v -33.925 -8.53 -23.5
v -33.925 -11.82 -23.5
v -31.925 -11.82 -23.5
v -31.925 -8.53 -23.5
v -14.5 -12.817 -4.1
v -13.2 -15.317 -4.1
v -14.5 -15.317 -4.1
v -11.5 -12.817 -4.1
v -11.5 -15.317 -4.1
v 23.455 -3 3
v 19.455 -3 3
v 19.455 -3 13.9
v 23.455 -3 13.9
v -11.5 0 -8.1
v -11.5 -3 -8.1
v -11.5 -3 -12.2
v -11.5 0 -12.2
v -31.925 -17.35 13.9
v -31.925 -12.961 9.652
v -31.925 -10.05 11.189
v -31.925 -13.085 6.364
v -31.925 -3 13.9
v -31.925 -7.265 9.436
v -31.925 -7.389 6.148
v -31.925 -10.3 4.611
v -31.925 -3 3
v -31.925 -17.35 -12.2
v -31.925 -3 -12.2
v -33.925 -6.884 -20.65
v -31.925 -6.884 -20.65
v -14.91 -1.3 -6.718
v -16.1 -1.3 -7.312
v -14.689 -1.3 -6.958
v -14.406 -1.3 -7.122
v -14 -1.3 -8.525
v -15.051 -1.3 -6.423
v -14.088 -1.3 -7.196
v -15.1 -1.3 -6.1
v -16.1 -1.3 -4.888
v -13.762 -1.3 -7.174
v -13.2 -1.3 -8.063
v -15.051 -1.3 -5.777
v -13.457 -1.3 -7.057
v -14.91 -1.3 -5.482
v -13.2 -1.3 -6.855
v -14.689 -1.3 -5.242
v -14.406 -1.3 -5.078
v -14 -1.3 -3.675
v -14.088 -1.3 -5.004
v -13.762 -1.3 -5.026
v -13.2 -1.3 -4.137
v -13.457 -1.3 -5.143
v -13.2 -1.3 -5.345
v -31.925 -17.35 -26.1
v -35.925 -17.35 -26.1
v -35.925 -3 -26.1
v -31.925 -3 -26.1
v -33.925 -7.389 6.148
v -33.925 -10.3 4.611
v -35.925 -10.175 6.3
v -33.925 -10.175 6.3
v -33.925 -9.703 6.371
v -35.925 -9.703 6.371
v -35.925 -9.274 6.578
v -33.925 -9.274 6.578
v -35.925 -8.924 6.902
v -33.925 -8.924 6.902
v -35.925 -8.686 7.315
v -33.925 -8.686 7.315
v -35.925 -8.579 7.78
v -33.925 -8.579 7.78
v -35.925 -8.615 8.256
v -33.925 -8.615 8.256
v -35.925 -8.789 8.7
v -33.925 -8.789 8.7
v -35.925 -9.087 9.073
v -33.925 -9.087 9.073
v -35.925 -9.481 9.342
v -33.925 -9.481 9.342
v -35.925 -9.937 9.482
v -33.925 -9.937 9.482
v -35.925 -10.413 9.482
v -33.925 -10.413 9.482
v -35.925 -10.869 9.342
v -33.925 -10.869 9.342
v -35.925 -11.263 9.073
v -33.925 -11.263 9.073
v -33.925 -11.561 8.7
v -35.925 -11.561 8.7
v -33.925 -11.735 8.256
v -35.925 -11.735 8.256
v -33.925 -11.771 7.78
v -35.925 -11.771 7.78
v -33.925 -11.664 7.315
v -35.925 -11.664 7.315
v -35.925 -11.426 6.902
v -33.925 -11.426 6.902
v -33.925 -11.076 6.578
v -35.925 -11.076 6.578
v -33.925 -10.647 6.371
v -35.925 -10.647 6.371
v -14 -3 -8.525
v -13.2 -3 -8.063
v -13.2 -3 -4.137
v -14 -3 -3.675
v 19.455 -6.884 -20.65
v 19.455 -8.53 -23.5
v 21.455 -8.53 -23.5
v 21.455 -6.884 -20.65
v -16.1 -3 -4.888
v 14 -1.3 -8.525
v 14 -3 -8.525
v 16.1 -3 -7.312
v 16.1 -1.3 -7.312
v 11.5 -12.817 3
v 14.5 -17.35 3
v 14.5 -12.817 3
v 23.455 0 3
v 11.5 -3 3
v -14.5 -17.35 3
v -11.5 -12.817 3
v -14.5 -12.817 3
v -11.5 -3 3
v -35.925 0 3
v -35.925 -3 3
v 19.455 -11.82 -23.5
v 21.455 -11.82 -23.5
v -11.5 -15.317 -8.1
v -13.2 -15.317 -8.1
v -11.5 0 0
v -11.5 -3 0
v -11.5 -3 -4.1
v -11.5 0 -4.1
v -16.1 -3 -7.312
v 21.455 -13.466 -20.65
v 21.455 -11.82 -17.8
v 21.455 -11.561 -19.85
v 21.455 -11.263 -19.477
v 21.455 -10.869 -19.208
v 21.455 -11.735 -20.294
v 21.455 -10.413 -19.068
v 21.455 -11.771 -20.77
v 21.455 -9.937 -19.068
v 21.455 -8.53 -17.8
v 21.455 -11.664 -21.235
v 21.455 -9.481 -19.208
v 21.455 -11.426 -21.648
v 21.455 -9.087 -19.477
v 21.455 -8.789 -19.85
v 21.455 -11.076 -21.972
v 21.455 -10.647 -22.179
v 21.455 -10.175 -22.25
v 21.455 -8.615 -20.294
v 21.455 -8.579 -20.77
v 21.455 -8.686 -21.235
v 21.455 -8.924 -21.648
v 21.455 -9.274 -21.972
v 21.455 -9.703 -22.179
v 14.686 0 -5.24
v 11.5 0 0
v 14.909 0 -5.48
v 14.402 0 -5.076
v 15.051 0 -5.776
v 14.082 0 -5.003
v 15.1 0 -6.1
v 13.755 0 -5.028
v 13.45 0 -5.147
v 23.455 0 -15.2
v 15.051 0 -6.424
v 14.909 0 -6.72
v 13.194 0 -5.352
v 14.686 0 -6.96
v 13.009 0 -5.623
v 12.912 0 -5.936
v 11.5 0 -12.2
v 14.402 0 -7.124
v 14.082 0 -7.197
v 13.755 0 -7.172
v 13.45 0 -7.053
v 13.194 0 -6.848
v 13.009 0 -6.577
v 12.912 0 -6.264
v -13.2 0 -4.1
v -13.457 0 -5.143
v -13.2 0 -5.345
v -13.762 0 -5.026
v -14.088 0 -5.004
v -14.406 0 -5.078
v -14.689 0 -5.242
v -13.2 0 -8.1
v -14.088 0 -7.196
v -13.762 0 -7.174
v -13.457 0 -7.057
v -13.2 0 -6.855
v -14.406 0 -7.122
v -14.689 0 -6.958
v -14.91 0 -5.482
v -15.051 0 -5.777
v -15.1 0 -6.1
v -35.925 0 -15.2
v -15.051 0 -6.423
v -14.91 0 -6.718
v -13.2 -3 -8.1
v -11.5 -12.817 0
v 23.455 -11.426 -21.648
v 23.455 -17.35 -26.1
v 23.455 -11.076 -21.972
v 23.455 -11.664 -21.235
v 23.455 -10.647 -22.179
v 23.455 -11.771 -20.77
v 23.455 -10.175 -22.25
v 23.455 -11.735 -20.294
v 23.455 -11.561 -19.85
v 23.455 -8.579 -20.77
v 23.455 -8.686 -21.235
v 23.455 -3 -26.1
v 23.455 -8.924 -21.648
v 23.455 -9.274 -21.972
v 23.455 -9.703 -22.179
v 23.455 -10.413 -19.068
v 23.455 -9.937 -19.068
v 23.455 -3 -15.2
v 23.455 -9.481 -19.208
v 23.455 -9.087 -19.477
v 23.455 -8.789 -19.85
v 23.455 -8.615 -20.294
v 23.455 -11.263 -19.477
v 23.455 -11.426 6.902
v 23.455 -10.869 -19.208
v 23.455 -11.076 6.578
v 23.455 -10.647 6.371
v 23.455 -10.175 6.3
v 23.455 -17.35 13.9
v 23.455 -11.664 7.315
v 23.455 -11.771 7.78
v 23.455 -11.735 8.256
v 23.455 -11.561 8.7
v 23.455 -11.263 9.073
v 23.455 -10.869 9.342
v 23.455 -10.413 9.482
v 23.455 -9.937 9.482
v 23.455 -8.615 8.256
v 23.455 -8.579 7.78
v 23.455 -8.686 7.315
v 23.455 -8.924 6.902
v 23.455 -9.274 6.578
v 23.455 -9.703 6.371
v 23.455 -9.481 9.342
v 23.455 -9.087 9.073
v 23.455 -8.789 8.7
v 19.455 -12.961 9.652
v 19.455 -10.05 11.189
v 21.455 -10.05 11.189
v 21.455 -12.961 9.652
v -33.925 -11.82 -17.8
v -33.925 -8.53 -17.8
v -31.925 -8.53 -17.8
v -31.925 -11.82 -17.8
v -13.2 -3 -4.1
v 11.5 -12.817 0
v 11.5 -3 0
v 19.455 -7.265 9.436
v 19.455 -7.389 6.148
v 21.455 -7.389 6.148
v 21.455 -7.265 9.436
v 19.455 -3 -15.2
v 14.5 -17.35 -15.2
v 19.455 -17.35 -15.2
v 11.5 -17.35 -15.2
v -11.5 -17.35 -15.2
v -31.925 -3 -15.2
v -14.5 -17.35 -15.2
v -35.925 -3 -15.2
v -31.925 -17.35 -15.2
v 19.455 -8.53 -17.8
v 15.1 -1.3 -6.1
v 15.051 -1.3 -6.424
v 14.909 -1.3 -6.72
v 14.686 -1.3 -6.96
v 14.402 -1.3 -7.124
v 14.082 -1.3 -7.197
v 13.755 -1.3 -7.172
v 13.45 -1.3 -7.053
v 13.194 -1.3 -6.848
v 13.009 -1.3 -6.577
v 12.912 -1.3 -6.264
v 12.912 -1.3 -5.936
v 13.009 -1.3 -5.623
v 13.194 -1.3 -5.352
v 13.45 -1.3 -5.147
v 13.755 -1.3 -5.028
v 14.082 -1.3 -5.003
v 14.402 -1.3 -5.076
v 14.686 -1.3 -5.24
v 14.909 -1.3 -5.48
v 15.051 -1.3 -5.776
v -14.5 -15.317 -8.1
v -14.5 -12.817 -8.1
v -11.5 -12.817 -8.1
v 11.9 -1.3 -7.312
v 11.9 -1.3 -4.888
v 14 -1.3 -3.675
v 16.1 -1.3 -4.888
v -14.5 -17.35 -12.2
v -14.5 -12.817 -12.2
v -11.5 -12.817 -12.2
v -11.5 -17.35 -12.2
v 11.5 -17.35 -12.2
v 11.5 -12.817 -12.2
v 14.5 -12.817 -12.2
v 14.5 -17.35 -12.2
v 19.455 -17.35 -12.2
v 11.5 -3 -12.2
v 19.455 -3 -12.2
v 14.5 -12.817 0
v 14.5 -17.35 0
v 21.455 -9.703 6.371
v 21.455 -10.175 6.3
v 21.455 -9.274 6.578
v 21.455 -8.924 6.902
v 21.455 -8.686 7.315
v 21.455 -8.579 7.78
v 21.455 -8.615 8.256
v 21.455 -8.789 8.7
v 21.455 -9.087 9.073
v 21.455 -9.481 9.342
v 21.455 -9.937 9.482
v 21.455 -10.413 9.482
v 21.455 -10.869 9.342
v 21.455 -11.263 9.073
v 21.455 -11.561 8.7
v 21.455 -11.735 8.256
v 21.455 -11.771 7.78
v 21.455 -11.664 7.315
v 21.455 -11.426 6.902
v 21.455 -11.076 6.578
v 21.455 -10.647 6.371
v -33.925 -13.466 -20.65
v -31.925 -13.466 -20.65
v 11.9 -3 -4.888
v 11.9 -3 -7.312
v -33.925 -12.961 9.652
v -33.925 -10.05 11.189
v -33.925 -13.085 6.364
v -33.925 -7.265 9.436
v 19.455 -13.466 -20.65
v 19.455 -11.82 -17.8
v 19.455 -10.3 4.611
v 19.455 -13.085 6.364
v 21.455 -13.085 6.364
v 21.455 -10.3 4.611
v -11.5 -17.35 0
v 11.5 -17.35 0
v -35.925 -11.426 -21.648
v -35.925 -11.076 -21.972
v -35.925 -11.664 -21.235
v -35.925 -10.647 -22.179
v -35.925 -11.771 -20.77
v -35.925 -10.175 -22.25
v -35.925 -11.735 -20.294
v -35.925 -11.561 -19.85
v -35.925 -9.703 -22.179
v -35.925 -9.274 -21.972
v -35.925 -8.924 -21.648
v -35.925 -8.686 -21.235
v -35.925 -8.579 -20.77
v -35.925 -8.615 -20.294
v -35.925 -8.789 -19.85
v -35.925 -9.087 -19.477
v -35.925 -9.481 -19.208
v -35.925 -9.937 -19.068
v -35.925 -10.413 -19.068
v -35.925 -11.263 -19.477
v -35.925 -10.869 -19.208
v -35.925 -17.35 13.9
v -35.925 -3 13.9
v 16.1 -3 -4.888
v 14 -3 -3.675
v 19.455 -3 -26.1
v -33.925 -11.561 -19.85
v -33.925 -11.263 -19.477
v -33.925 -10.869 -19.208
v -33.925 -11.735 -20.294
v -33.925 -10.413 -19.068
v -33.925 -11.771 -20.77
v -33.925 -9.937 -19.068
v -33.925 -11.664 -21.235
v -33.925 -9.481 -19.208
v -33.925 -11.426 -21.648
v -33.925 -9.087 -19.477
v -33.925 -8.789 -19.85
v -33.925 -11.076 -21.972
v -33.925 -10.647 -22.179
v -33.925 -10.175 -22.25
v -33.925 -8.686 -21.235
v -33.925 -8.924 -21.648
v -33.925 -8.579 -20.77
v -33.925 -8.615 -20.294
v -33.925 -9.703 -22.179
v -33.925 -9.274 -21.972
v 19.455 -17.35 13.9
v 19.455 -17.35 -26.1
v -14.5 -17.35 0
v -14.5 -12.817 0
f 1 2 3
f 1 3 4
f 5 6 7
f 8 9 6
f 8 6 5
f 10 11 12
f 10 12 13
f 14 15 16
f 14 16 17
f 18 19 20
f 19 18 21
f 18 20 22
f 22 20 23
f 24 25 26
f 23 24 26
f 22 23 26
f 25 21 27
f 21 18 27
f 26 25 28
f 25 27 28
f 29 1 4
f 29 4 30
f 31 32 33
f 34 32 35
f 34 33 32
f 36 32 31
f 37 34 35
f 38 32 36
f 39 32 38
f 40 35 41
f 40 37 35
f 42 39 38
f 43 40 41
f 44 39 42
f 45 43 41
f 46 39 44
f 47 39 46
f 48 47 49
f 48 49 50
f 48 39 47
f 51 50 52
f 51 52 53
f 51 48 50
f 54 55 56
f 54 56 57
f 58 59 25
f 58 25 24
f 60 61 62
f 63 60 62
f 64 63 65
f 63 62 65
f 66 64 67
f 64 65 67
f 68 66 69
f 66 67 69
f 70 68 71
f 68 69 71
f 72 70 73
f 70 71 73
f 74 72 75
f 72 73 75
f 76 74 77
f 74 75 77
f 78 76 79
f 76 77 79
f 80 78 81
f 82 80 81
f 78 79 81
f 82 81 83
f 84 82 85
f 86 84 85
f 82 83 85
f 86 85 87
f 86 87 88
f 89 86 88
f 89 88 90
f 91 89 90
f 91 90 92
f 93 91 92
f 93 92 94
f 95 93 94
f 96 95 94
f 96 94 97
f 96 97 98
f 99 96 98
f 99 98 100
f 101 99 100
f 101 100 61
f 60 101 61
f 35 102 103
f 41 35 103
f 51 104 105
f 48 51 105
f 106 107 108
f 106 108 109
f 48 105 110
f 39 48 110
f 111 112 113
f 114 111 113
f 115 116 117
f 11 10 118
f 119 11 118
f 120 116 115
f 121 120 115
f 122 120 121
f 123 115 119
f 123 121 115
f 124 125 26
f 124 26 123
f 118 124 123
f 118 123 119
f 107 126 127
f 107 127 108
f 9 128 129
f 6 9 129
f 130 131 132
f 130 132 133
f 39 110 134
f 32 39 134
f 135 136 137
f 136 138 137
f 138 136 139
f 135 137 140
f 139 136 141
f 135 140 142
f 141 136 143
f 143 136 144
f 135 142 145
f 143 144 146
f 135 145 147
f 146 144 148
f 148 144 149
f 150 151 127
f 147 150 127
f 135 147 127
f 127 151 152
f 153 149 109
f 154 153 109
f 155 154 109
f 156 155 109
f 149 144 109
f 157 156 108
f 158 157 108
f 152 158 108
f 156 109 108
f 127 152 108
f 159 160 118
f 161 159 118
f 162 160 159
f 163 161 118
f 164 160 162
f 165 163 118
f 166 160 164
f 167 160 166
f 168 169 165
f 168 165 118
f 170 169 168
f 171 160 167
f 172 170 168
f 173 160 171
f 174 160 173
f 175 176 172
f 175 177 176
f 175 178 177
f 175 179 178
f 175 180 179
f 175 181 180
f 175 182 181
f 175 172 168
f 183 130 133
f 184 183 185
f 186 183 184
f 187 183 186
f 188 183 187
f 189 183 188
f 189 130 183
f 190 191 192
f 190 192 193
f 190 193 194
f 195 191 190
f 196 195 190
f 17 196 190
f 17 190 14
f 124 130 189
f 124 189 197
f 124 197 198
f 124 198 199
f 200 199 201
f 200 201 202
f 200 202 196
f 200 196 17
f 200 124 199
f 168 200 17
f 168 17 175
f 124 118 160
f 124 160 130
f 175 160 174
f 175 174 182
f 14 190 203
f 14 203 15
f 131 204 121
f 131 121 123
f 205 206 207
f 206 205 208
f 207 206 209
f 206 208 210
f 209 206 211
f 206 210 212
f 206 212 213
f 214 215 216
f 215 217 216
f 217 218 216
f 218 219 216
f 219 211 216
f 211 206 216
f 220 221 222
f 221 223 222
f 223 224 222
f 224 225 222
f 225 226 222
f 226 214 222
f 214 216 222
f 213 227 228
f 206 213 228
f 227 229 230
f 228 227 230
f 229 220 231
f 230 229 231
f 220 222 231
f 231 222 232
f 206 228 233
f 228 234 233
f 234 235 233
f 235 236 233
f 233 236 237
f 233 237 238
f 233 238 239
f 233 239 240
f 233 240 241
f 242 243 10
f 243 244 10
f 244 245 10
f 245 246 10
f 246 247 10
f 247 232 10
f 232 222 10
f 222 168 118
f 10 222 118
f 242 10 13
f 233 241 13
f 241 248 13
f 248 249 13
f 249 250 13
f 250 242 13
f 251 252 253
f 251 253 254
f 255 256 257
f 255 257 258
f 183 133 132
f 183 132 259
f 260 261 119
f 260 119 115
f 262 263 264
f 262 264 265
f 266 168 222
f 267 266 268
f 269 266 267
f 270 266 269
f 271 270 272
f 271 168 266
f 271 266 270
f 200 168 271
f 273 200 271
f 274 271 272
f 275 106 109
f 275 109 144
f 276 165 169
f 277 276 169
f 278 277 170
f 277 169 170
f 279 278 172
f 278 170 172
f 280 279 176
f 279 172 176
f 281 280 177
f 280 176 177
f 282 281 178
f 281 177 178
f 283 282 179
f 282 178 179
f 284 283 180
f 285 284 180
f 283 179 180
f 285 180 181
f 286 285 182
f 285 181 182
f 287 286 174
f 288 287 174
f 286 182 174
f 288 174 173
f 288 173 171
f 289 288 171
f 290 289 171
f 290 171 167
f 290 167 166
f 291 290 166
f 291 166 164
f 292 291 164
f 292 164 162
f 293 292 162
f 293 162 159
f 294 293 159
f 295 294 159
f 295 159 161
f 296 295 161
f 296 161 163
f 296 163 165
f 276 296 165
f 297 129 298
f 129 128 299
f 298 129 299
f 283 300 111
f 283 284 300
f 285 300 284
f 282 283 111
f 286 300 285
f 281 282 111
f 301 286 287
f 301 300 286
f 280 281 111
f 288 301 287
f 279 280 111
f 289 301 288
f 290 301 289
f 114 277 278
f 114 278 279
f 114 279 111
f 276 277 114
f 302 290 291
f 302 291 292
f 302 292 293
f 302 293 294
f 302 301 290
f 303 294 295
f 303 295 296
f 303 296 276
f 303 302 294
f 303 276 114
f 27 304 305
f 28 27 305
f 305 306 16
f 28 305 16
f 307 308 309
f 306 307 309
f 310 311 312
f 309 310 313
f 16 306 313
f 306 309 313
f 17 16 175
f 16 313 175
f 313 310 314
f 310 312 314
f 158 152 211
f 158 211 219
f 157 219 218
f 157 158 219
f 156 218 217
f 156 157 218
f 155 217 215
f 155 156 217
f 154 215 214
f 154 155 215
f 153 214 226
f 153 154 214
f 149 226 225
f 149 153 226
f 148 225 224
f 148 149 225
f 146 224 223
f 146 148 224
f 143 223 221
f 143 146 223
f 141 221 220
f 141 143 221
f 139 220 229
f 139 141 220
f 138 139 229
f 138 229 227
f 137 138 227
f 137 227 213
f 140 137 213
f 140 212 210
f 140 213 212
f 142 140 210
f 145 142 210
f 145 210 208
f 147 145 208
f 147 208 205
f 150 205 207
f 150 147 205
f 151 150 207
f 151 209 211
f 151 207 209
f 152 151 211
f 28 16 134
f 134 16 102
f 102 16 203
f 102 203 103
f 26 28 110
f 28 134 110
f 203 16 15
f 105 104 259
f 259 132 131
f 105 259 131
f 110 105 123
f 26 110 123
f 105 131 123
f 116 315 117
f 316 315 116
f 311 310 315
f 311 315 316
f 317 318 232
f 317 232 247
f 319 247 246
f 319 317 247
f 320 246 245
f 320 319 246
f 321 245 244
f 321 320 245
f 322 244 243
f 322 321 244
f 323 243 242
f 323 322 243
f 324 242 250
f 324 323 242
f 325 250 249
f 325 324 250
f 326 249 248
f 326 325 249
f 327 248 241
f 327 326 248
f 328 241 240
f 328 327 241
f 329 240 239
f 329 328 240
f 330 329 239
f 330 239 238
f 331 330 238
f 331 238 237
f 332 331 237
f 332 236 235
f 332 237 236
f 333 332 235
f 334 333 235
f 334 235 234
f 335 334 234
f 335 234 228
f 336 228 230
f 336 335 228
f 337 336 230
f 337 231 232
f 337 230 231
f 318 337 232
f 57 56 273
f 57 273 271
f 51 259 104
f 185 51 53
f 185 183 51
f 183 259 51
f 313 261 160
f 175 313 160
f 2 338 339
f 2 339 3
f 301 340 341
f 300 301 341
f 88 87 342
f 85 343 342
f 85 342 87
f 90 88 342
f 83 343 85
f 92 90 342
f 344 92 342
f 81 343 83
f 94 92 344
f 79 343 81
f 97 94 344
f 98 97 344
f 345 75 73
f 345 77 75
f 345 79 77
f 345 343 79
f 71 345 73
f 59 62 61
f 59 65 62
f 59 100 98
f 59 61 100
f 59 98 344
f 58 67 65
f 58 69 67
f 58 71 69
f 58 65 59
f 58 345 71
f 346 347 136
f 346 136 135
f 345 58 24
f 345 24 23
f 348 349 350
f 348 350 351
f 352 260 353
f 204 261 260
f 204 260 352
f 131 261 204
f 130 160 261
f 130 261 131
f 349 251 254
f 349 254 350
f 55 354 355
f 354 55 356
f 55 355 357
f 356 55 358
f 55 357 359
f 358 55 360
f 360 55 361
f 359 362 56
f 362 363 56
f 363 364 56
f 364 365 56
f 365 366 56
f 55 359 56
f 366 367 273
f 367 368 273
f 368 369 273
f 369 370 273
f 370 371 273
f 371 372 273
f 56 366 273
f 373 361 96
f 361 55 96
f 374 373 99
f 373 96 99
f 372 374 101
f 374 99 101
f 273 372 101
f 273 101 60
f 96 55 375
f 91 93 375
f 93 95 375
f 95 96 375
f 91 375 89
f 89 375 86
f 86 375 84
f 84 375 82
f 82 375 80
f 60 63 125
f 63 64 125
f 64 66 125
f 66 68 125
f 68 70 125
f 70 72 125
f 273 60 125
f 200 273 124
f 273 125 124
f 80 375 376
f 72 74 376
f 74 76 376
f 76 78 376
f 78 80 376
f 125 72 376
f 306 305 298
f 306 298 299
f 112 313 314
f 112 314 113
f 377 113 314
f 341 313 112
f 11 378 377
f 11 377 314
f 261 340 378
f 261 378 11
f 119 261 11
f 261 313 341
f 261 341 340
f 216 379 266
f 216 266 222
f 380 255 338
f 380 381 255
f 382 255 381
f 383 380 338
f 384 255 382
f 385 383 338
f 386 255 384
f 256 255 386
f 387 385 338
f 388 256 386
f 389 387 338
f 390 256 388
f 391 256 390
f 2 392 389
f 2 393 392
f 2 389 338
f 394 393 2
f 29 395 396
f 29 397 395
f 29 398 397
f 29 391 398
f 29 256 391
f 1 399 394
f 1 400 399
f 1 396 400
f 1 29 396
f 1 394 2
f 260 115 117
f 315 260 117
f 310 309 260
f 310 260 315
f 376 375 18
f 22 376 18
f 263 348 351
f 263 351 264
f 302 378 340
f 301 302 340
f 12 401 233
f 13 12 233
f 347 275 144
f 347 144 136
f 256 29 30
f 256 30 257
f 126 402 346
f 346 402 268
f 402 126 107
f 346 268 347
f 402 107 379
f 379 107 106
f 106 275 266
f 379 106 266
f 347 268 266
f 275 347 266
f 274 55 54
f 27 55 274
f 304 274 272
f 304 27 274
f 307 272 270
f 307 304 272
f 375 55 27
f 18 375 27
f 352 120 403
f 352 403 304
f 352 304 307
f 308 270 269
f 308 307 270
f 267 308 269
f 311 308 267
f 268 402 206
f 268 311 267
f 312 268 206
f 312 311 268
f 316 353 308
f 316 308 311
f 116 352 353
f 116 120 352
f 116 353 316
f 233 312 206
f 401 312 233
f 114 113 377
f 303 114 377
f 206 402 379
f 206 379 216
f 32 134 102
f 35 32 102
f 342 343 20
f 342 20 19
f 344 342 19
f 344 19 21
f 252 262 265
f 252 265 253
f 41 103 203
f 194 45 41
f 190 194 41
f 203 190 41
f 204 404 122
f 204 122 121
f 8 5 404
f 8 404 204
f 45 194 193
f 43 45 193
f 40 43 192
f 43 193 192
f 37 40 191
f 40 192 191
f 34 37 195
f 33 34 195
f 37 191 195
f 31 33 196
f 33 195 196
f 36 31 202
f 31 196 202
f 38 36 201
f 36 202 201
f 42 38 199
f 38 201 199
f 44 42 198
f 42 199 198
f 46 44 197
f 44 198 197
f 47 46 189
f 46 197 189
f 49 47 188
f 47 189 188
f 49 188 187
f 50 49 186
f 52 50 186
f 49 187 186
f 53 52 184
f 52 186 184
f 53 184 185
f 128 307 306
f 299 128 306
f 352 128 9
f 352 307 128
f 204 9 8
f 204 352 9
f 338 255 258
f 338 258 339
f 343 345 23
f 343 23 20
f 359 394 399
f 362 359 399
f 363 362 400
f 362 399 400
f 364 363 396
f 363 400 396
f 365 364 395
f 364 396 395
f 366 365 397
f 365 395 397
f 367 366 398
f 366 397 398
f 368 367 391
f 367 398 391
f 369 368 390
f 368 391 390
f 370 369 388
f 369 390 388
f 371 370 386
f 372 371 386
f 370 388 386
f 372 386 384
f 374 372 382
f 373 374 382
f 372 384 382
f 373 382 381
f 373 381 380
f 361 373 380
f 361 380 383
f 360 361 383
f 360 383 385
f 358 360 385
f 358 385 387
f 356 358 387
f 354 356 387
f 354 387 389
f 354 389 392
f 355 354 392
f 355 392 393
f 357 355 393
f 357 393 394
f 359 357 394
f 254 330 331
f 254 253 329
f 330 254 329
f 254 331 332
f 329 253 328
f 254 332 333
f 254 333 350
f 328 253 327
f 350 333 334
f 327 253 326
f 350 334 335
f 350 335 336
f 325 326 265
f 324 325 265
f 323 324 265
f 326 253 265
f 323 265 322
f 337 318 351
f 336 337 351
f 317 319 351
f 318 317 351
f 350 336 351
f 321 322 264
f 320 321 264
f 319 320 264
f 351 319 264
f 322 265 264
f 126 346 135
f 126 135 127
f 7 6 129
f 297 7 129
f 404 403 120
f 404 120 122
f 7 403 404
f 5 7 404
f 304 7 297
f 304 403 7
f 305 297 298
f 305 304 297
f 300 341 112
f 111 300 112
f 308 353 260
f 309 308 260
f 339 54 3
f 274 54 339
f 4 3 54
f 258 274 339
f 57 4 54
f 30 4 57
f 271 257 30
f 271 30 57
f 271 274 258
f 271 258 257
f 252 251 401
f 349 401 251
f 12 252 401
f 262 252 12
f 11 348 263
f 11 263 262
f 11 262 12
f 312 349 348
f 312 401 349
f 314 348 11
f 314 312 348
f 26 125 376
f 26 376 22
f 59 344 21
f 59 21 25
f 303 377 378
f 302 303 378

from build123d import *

# Parameters (mm, degrees)
BOSS_EXTRUDE1_DEPTH      = 3
SKETCH2_W                = 5
SKETCH2_H                = 3
SKETCH2_W_2              = 3
SKETCH2_H_2              = 4.533238731
BOSS_EXTRUDE2_DEPTH      = 15.2
BOSS_EXTRUDE3_DEPTH      = 3
BOSS_EXTRUDE4_DEPTH      = 19.425
BOSS_EXTRUDE5_DEPTH      = 6.955
CUT_EXTRUDE1_REACH       = 19.35
SKETCH6_R                = 1.1
CUT_EXTRUDE2_DEPTH       = 1.7
SKETCH8_W                = 4
SKETCH8_H                = 14.35
BOSS_EXTRUDE6_DEPTH      = 26.1
BOSS_EXTRUDE6_DEPTH_BACK = 13.9
SKETCH10_R               = 1.6
CUT_EXTRUDE3_DEPTH       = 56.38
CUT_EXTRUDE3_DEPTH_BACK  = 5
CUT_EXTRUDE5_START       = -2
CUT_EXTRUDE5_DEPTH       = 55.38
CUT_EXTRUDE6_DEPTH       = 7.5
CUT_EXTRUDE6_DEPTH_BACK  = 15.316761
CUT_EXTRUDE7_REACH       = 24.725
SKETCH13_W               = 4
SKETCH13_H               = 2.5


with BuildPart() as part:
    # Sketch1 → Boss-Extrude1 (new body)
    with BuildSketch(Plane.XY):
        Polygon((16.5, 0), (16.5, -3), (11.5, -3), (11.5, -12.816761269), (14.5, -12.816761269), (14.5, -17.35), (-14.5, -17.35), (-14.5, -12.816761269), (-11.5, -12.816761269), (-11.5, -3), (-16.5, -3), (-16.5, 0), align=None)
    extrude(amount=BOSS_EXTRUDE1_DEPTH)

    # Sketch2 → Boss-Extrude2 (add)
    with BuildSketch(Plane(origin=(0, 0, 0), x_dir=(-1, 0, 0), z_dir=(0, 0, -1))):
        with Locations((-14, -1.5)):
            Rectangle(SKETCH2_W, SKETCH2_H)
        with Locations((14, -1.5)):
            Rectangle(SKETCH2_W, SKETCH2_H)
        with Locations((-13, -15.083380635)):
            Rectangle(SKETCH2_W_2, SKETCH2_H_2)
        with Locations((13, -15.083380635)):
            Rectangle(SKETCH2_W_2, SKETCH2_H_2)
    extrude(amount=BOSS_EXTRUDE2_DEPTH)

    # Sketch3 → Boss-Extrude3 (add)
    with BuildSketch(Plane(origin=(0, 0, -12.2), x_dir=(-1, 0, 0), z_dir=(0, 0, -1))):
        Polygon((-11.5, -17.35), (16.5, -17.35), (16.5, 0), (-16.5, 0), (-16.5, -17.35), align=None)
    extrude(amount=BOSS_EXTRUDE3_DEPTH)

    # Sketch4 → Boss-Extrude4 (add)
    with BuildSketch(Plane.ZY.offset(16.5)):
        Polygon((-15.2, -17.35), (-12.2, -17.35), (-12.2, -3), (3, -3), (3, 0), (-15.2, 0), align=None)
    extrude(amount=BOSS_EXTRUDE4_DEPTH)

    # Sketch5 → Boss-Extrude5 (add)
    with BuildSketch(Plane(origin=(16.5, 0, 0), x_dir=(0, 0, -1), z_dir=(1, 0, 0))):
        Polygon((-3, 0), (15.2, 0), (15.2, -17.35), (12.2, -17.35), (12.2, -3), (-3, -3), align=None)
    extrude(amount=BOSS_EXTRUDE5_DEPTH)

    # Sketch6 → Cut-Extrude1 (cut, up to next)
    with BuildSketch(Plane(origin=(0, 0, 0), x_dir=(1, 0, 0), z_dir=(0, 1, 0)), mode=Mode.PRIVATE) as cut_extrude1_sk1:
        with Locations((14, 6.1)):
            Circle(SKETCH6_R)
    cut_extrude1_tool1 = extrude(cut_extrude1_sk1.sketch, amount=-CUT_EXTRUDE1_REACH, mode=Mode.PRIVATE) & part.part
    add(cut_extrude1_tool1.solids().sort_by_distance((14, 0, -6.1))[0], mode=Mode.SUBTRACT)
    # Sketch6 → Cut-Extrude1 (cut, up to next)
    with BuildSketch(Plane(origin=(0, 0, 0), x_dir=(1, 0, 0), z_dir=(0, 1, 0)), mode=Mode.PRIVATE) as cut_extrude1_sk2:
        with Locations((-14, 6.1)):
            Circle(SKETCH6_R)
    cut_extrude1_tool2 = extrude(cut_extrude1_sk2.sketch, amount=-CUT_EXTRUDE1_REACH, mode=Mode.PRIVATE) & part.part
    add(cut_extrude1_tool2.solids().sort_by_distance((-14, 0, -6.1))[0], mode=Mode.SUBTRACT)

    # Sketch7 → Cut-Extrude2 (cut)
    with BuildSketch(Plane.XZ.offset(3)):
        Polygon((14, -3.675128869), (11.9, -4.887564435), (11.9, -7.312435565), (14, -8.524871131), (16.1, -7.312435565), (16.1, -4.887564435), align=None)
        Polygon((-14, -3.675128869), (-16.1, -4.887564435), (-16.1, -7.312435565), (-14, -8.524871131), (-11.9, -7.312435565), (-11.9, -4.887564435), align=None)
    extrude(amount=-CUT_EXTRUDE2_DEPTH, mode=Mode.SUBTRACT)

    # Sketch8 → Boss-Extrude6 (add, two sides)
    with BuildSketch(Plane.XY.offset(-12.2)) as boss_extrude6_sk:
        with Locations((-33.925, -10.175)):
            Rectangle(SKETCH8_W, SKETCH8_H)
        with Locations((21.455, -10.175)):
            Rectangle(SKETCH8_W, SKETCH8_H)
    extrude(amount=BOSS_EXTRUDE6_DEPTH)
    extrude(boss_extrude6_sk.sketch, amount=-BOSS_EXTRUDE6_DEPTH_BACK)

    # Sketch10 → Cut-Extrude3 (cut, two sides)
    with BuildSketch(Plane(origin=(-31.925, 0, 0), x_dir=(0, 0, -1), z_dir=(1, 0, 0))) as cut_extrude3_sk:
        with Locations((-7.9, -10.175)):
            Circle(SKETCH10_R)
        with Locations((20.65, -10.175)):
            Circle(SKETCH10_R)
    extrude(amount=CUT_EXTRUDE3_DEPTH, mode=Mode.SUBTRACT)
    extrude(cut_extrude3_sk.sketch, amount=-CUT_EXTRUDE3_DEPTH_BACK, mode=Mode.SUBTRACT)

    # Sketch11 → Cut-Extrude5 (cut)
    with BuildSketch(Plane(origin=(-31.925, 0, 0), x_dir=(0, 0, -1), z_dir=(1, 0, 0)).offset(CUT_EXTRUDE5_START)):
        Polygon((-9.652389588, -12.960521627), (-6.363862302, -13.085374714), (-4.611472715, -10.299853087), (-6.147610412, -7.389478373), (-9.436137698, -7.264625286), (-11.188527285, -10.050146913), align=None)
        Polygon((20.65, -13.465896534), (23.5, -11.820448267), (23.5, -8.529551733), (20.65, -6.884103466), (17.8, -8.529551733), (17.8, -11.820448267), align=None)
    extrude(amount=CUT_EXTRUDE5_DEPTH, mode=Mode.SUBTRACT)

    # Sketch12 → Cut-Extrude6 (cut, two sides)
    with BuildSketch(Plane(origin=(0, 0, 0), x_dir=(1, 0, 0), z_dir=(0, 1, 0))) as cut_extrude6_sk:
        Polygon((-11.5, 6.1), (-11.5, 4.1), (-13.2, 4.1), (-13.2, 8.1), (-11.5, 8.1), align=None)
    extrude(amount=CUT_EXTRUDE6_DEPTH, mode=Mode.SUBTRACT)
    extrude(cut_extrude6_sk.sketch, amount=-CUT_EXTRUDE6_DEPTH_BACK, mode=Mode.SUBTRACT)

    # Sketch13 → Cut-Extrude7 (cut, up to next)
    with BuildSketch(Plane(origin=(-13.2, 0, 0), x_dir=(0, 0, -1), z_dir=(1, 0, 0)), mode=Mode.PRIVATE) as cut_extrude7_sk1:
        with Locations((6.1, -14.066761269)):
            Rectangle(SKETCH13_W, SKETCH13_H)
    cut_extrude7_tool1 = extrude(cut_extrude7_sk1.sketch, amount=-CUT_EXTRUDE7_REACH, mode=Mode.PRIVATE) & part.part
    add(cut_extrude7_tool1.solids().sort_by_distance((-13.2, -14.066761, -6.1))[0], mode=Mode.SUBTRACT)


solid = part.part
